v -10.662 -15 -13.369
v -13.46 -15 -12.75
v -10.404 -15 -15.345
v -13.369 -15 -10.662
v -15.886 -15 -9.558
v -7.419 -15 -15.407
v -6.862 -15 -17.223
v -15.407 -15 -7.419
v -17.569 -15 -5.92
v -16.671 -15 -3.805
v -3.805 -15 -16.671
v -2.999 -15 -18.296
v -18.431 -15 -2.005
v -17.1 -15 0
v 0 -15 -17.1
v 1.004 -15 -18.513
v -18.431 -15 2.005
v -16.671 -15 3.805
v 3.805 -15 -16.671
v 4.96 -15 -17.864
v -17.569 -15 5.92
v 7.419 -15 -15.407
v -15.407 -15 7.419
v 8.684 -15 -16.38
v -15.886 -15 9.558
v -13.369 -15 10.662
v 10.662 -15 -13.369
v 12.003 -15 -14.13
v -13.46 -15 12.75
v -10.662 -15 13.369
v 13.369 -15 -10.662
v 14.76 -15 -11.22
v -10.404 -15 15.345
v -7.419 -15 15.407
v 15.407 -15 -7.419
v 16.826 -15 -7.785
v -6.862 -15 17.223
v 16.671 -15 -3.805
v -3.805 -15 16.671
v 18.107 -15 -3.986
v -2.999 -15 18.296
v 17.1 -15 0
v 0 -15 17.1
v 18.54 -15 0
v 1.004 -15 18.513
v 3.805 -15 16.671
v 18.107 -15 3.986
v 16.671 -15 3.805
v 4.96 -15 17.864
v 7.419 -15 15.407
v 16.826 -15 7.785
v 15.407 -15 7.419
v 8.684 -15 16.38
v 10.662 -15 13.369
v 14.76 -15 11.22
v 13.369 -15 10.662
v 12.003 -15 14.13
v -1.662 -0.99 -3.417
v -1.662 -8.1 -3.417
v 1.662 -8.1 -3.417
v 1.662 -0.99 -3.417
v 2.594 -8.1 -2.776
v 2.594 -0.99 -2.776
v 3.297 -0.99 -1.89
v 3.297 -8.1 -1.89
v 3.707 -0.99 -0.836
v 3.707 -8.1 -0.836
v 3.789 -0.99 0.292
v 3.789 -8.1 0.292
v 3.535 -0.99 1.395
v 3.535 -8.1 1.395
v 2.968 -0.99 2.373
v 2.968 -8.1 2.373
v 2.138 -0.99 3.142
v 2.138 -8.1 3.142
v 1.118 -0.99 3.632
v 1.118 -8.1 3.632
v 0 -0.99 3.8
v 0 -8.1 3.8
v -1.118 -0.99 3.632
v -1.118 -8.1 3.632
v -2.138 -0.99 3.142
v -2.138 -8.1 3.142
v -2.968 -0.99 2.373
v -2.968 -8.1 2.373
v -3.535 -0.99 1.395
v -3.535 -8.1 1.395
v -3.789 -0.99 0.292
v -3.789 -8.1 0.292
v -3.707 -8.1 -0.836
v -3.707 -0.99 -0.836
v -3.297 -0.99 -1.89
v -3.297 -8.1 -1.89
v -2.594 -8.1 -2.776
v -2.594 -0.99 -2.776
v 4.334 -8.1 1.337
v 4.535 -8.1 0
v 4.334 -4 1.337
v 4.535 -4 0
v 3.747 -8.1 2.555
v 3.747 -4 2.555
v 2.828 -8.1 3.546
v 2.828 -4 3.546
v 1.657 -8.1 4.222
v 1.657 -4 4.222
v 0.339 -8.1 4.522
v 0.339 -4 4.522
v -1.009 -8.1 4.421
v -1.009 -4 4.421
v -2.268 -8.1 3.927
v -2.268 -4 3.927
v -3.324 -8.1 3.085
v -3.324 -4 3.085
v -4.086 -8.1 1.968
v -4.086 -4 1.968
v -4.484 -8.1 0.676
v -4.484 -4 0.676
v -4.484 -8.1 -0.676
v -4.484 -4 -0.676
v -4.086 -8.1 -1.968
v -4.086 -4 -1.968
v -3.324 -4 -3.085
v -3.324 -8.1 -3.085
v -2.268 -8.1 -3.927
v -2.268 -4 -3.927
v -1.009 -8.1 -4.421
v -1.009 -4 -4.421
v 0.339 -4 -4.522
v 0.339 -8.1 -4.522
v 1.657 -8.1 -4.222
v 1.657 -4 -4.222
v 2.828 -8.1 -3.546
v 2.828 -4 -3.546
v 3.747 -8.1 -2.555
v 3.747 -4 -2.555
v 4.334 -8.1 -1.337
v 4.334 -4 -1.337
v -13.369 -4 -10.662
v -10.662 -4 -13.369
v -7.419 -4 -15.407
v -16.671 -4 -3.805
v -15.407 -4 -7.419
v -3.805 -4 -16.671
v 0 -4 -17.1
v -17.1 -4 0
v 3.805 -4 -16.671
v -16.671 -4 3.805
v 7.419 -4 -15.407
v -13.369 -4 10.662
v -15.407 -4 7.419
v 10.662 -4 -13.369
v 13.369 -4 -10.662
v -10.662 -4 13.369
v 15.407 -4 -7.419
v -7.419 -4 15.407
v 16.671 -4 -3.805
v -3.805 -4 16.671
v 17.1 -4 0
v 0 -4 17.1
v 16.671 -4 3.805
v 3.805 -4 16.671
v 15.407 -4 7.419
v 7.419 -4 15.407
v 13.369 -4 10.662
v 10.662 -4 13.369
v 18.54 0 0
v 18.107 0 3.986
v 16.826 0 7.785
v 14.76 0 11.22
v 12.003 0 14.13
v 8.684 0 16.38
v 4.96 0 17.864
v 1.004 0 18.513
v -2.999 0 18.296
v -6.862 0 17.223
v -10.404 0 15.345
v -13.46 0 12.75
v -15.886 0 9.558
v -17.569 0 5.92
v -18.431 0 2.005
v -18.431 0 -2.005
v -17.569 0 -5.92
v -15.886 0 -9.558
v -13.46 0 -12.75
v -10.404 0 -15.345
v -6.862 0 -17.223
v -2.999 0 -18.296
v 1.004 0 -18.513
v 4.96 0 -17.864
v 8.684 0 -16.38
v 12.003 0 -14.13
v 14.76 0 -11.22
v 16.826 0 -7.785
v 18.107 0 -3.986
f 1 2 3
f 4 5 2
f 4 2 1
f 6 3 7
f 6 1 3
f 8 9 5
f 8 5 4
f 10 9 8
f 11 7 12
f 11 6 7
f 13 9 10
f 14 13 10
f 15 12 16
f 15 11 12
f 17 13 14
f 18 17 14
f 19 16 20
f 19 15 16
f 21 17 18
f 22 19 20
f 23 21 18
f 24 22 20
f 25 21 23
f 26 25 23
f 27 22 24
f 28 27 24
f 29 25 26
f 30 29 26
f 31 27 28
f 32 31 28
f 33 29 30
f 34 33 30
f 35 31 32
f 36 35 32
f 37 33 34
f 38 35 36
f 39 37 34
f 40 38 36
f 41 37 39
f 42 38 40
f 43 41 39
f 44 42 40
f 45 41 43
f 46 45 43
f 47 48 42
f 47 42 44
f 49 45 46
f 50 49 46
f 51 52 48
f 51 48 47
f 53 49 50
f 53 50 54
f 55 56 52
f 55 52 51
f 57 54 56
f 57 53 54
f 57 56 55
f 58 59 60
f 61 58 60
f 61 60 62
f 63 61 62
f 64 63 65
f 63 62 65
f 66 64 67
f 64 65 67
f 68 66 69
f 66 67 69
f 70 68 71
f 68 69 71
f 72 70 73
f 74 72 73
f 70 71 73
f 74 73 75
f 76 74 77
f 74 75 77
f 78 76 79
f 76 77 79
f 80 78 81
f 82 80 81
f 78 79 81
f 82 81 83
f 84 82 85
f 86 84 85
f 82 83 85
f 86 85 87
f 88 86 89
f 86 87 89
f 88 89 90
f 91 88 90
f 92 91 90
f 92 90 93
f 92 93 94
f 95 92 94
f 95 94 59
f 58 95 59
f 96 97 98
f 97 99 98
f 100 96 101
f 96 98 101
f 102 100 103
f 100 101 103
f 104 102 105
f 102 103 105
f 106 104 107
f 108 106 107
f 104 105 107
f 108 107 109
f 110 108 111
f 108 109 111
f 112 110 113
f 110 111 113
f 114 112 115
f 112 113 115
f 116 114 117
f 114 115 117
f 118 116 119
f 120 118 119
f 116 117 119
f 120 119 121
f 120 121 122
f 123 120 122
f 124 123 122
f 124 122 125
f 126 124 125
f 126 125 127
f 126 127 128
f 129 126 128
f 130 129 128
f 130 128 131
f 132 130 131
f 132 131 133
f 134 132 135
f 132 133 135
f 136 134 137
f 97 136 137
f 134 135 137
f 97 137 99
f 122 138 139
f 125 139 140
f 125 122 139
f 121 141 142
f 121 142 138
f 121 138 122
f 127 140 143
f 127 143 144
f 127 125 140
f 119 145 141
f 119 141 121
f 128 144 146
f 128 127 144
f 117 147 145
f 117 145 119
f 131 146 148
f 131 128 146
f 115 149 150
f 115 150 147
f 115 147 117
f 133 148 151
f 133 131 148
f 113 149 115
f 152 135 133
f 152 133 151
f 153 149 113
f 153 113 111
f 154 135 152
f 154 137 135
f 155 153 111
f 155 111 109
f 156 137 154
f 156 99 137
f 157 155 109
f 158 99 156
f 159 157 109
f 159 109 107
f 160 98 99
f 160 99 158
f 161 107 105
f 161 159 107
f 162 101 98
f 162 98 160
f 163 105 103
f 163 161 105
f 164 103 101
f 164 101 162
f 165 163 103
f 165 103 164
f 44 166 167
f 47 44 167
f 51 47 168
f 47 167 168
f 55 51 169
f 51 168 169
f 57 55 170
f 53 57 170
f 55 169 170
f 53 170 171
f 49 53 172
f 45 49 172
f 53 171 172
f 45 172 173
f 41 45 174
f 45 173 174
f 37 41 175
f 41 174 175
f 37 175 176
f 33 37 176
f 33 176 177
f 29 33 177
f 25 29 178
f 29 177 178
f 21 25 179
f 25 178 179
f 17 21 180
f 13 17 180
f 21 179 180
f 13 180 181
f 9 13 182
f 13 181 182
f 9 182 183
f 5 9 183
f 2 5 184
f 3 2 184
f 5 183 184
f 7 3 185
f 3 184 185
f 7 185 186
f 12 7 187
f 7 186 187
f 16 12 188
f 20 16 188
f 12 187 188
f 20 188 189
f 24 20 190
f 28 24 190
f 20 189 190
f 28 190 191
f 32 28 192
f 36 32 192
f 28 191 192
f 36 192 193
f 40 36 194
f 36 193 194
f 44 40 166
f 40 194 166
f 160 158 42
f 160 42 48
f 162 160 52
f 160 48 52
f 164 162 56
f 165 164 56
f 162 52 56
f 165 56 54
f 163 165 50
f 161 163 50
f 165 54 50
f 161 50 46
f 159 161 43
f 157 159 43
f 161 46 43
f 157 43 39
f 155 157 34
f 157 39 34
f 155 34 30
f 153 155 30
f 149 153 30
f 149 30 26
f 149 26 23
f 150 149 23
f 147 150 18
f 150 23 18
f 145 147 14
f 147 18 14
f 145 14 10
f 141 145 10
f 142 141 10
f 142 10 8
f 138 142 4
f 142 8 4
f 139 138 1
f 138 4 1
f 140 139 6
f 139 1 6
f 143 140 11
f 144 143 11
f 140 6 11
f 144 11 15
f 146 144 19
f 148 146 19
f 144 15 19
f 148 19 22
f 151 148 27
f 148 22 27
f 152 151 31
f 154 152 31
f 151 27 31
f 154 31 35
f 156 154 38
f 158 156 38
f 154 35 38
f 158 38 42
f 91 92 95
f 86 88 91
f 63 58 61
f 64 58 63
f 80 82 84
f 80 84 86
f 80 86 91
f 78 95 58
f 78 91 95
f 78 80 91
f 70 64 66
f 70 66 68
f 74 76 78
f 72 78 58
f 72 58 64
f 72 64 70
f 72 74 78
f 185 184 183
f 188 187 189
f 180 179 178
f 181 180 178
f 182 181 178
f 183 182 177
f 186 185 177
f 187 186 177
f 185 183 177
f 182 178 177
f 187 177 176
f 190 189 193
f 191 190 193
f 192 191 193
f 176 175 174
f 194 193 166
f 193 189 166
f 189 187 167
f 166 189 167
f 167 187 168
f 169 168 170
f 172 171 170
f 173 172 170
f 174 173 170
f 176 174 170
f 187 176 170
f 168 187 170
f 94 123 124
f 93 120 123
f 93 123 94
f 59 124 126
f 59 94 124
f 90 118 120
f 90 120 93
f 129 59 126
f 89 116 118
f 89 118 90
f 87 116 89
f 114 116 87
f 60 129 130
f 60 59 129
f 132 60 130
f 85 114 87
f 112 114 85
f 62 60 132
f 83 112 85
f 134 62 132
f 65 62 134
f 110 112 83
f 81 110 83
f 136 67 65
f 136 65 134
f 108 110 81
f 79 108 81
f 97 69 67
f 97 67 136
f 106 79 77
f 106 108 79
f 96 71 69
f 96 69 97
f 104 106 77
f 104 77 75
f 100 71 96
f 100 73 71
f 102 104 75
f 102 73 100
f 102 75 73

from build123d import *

# Parameters (mm, degrees)
F0_R      = 18.54
F1_DEPTH  = 15
F2_R      = 17.1
F3_DEPTH  = 11
F5_R      = 4.535
F6_DEPTH  = 6
F9_DEPTH  = 9.01
F7_R      = 4.535
F10_DEPTH = 1.5
F11_DEPTH = 3.4


with BuildPart() as f1:
    # F0 (on Front) → F1 (new body)
    with BuildSketch(Plane.XZ):
        Circle(F0_R)
        with BuildLine():
            ThreePointArc((-2.5, -3.7836787654), (-2.1481067245, 3.9939782799), (4.535, 0))
            ThreePointArc((4.535, 0), (3.9939782799, -2.1481067245), (2.5, -3.7836787654))
            ThreePointArc((2.5, -3.7836787654), (0, -4.535), (-2.5, -3.7836787654))
        make_face(mode=Mode.SUBTRACT)
        with BuildLine():
            ThreePointArc((2.5, -3.7836787654), (3.9939782799, -2.1481067245), (4.535, 0))
            ThreePointArc((4.535, 0), (-2.1481067245, 3.9939782799), (-2.5, -3.7836787654))
            Line((-2.5, -3.7836787654), (2.5, -3.7836787654))
        make_face()
        with BuildLine():
            Line((2.5, -3.7836787654), (-2.5, -3.7836787654))
            ThreePointArc((-2.5, -3.7836787654), (0, -4.535), (2.5, -3.7836787654))
        make_face()
    extrude(amount=F1_DEPTH)

    # F2 (on face) → F3 (cut)
    with BuildSketch(Plane.XZ.offset(15)):
        Circle(F2_R)
    extrude(amount=-F3_DEPTH, mode=Mode.SUBTRACT)

    # F5 (on face) → F6 (join)
    with BuildSketch(Plane.XZ.offset(4)):
        Circle(F5_R)
    extrude(amount=F6_DEPTH)

    # F8 (on face) → F9 (cut)
    with BuildSketch(Plane.XZ.offset(10)):
        with BuildLine():
            ThreePointArc((1.662322006, -3.4171165547), (3.221554254, -2.0153382318), (3.8, 0))
            ThreePointArc((3.8, 0), (-2.0153382318, 3.221554254), (-1.662322006, -3.4171165547))
            Line((-1.662322006, -3.4171165547), (1.662322006, -3.4171165547))
        make_face()
    extrude(amount=-F9_DEPTH, mode=Mode.SUBTRACT)

    # F7 (on face) → F10 (join)
    with BuildSketch(Plane.XZ.offset(10)):
        Circle(F7_R)
    extrude(amount=F10_DEPTH)

    # F11 (cut): a face of the model
    f11_faces = [f1.faces().sort_by_distance(p)[0] for p in [
        (0, -11.5, 0),
    ]]
    extrude(f11_faces, amount=-F11_DEPTH, mode=Mode.SUBTRACT)


solid = f1.part
